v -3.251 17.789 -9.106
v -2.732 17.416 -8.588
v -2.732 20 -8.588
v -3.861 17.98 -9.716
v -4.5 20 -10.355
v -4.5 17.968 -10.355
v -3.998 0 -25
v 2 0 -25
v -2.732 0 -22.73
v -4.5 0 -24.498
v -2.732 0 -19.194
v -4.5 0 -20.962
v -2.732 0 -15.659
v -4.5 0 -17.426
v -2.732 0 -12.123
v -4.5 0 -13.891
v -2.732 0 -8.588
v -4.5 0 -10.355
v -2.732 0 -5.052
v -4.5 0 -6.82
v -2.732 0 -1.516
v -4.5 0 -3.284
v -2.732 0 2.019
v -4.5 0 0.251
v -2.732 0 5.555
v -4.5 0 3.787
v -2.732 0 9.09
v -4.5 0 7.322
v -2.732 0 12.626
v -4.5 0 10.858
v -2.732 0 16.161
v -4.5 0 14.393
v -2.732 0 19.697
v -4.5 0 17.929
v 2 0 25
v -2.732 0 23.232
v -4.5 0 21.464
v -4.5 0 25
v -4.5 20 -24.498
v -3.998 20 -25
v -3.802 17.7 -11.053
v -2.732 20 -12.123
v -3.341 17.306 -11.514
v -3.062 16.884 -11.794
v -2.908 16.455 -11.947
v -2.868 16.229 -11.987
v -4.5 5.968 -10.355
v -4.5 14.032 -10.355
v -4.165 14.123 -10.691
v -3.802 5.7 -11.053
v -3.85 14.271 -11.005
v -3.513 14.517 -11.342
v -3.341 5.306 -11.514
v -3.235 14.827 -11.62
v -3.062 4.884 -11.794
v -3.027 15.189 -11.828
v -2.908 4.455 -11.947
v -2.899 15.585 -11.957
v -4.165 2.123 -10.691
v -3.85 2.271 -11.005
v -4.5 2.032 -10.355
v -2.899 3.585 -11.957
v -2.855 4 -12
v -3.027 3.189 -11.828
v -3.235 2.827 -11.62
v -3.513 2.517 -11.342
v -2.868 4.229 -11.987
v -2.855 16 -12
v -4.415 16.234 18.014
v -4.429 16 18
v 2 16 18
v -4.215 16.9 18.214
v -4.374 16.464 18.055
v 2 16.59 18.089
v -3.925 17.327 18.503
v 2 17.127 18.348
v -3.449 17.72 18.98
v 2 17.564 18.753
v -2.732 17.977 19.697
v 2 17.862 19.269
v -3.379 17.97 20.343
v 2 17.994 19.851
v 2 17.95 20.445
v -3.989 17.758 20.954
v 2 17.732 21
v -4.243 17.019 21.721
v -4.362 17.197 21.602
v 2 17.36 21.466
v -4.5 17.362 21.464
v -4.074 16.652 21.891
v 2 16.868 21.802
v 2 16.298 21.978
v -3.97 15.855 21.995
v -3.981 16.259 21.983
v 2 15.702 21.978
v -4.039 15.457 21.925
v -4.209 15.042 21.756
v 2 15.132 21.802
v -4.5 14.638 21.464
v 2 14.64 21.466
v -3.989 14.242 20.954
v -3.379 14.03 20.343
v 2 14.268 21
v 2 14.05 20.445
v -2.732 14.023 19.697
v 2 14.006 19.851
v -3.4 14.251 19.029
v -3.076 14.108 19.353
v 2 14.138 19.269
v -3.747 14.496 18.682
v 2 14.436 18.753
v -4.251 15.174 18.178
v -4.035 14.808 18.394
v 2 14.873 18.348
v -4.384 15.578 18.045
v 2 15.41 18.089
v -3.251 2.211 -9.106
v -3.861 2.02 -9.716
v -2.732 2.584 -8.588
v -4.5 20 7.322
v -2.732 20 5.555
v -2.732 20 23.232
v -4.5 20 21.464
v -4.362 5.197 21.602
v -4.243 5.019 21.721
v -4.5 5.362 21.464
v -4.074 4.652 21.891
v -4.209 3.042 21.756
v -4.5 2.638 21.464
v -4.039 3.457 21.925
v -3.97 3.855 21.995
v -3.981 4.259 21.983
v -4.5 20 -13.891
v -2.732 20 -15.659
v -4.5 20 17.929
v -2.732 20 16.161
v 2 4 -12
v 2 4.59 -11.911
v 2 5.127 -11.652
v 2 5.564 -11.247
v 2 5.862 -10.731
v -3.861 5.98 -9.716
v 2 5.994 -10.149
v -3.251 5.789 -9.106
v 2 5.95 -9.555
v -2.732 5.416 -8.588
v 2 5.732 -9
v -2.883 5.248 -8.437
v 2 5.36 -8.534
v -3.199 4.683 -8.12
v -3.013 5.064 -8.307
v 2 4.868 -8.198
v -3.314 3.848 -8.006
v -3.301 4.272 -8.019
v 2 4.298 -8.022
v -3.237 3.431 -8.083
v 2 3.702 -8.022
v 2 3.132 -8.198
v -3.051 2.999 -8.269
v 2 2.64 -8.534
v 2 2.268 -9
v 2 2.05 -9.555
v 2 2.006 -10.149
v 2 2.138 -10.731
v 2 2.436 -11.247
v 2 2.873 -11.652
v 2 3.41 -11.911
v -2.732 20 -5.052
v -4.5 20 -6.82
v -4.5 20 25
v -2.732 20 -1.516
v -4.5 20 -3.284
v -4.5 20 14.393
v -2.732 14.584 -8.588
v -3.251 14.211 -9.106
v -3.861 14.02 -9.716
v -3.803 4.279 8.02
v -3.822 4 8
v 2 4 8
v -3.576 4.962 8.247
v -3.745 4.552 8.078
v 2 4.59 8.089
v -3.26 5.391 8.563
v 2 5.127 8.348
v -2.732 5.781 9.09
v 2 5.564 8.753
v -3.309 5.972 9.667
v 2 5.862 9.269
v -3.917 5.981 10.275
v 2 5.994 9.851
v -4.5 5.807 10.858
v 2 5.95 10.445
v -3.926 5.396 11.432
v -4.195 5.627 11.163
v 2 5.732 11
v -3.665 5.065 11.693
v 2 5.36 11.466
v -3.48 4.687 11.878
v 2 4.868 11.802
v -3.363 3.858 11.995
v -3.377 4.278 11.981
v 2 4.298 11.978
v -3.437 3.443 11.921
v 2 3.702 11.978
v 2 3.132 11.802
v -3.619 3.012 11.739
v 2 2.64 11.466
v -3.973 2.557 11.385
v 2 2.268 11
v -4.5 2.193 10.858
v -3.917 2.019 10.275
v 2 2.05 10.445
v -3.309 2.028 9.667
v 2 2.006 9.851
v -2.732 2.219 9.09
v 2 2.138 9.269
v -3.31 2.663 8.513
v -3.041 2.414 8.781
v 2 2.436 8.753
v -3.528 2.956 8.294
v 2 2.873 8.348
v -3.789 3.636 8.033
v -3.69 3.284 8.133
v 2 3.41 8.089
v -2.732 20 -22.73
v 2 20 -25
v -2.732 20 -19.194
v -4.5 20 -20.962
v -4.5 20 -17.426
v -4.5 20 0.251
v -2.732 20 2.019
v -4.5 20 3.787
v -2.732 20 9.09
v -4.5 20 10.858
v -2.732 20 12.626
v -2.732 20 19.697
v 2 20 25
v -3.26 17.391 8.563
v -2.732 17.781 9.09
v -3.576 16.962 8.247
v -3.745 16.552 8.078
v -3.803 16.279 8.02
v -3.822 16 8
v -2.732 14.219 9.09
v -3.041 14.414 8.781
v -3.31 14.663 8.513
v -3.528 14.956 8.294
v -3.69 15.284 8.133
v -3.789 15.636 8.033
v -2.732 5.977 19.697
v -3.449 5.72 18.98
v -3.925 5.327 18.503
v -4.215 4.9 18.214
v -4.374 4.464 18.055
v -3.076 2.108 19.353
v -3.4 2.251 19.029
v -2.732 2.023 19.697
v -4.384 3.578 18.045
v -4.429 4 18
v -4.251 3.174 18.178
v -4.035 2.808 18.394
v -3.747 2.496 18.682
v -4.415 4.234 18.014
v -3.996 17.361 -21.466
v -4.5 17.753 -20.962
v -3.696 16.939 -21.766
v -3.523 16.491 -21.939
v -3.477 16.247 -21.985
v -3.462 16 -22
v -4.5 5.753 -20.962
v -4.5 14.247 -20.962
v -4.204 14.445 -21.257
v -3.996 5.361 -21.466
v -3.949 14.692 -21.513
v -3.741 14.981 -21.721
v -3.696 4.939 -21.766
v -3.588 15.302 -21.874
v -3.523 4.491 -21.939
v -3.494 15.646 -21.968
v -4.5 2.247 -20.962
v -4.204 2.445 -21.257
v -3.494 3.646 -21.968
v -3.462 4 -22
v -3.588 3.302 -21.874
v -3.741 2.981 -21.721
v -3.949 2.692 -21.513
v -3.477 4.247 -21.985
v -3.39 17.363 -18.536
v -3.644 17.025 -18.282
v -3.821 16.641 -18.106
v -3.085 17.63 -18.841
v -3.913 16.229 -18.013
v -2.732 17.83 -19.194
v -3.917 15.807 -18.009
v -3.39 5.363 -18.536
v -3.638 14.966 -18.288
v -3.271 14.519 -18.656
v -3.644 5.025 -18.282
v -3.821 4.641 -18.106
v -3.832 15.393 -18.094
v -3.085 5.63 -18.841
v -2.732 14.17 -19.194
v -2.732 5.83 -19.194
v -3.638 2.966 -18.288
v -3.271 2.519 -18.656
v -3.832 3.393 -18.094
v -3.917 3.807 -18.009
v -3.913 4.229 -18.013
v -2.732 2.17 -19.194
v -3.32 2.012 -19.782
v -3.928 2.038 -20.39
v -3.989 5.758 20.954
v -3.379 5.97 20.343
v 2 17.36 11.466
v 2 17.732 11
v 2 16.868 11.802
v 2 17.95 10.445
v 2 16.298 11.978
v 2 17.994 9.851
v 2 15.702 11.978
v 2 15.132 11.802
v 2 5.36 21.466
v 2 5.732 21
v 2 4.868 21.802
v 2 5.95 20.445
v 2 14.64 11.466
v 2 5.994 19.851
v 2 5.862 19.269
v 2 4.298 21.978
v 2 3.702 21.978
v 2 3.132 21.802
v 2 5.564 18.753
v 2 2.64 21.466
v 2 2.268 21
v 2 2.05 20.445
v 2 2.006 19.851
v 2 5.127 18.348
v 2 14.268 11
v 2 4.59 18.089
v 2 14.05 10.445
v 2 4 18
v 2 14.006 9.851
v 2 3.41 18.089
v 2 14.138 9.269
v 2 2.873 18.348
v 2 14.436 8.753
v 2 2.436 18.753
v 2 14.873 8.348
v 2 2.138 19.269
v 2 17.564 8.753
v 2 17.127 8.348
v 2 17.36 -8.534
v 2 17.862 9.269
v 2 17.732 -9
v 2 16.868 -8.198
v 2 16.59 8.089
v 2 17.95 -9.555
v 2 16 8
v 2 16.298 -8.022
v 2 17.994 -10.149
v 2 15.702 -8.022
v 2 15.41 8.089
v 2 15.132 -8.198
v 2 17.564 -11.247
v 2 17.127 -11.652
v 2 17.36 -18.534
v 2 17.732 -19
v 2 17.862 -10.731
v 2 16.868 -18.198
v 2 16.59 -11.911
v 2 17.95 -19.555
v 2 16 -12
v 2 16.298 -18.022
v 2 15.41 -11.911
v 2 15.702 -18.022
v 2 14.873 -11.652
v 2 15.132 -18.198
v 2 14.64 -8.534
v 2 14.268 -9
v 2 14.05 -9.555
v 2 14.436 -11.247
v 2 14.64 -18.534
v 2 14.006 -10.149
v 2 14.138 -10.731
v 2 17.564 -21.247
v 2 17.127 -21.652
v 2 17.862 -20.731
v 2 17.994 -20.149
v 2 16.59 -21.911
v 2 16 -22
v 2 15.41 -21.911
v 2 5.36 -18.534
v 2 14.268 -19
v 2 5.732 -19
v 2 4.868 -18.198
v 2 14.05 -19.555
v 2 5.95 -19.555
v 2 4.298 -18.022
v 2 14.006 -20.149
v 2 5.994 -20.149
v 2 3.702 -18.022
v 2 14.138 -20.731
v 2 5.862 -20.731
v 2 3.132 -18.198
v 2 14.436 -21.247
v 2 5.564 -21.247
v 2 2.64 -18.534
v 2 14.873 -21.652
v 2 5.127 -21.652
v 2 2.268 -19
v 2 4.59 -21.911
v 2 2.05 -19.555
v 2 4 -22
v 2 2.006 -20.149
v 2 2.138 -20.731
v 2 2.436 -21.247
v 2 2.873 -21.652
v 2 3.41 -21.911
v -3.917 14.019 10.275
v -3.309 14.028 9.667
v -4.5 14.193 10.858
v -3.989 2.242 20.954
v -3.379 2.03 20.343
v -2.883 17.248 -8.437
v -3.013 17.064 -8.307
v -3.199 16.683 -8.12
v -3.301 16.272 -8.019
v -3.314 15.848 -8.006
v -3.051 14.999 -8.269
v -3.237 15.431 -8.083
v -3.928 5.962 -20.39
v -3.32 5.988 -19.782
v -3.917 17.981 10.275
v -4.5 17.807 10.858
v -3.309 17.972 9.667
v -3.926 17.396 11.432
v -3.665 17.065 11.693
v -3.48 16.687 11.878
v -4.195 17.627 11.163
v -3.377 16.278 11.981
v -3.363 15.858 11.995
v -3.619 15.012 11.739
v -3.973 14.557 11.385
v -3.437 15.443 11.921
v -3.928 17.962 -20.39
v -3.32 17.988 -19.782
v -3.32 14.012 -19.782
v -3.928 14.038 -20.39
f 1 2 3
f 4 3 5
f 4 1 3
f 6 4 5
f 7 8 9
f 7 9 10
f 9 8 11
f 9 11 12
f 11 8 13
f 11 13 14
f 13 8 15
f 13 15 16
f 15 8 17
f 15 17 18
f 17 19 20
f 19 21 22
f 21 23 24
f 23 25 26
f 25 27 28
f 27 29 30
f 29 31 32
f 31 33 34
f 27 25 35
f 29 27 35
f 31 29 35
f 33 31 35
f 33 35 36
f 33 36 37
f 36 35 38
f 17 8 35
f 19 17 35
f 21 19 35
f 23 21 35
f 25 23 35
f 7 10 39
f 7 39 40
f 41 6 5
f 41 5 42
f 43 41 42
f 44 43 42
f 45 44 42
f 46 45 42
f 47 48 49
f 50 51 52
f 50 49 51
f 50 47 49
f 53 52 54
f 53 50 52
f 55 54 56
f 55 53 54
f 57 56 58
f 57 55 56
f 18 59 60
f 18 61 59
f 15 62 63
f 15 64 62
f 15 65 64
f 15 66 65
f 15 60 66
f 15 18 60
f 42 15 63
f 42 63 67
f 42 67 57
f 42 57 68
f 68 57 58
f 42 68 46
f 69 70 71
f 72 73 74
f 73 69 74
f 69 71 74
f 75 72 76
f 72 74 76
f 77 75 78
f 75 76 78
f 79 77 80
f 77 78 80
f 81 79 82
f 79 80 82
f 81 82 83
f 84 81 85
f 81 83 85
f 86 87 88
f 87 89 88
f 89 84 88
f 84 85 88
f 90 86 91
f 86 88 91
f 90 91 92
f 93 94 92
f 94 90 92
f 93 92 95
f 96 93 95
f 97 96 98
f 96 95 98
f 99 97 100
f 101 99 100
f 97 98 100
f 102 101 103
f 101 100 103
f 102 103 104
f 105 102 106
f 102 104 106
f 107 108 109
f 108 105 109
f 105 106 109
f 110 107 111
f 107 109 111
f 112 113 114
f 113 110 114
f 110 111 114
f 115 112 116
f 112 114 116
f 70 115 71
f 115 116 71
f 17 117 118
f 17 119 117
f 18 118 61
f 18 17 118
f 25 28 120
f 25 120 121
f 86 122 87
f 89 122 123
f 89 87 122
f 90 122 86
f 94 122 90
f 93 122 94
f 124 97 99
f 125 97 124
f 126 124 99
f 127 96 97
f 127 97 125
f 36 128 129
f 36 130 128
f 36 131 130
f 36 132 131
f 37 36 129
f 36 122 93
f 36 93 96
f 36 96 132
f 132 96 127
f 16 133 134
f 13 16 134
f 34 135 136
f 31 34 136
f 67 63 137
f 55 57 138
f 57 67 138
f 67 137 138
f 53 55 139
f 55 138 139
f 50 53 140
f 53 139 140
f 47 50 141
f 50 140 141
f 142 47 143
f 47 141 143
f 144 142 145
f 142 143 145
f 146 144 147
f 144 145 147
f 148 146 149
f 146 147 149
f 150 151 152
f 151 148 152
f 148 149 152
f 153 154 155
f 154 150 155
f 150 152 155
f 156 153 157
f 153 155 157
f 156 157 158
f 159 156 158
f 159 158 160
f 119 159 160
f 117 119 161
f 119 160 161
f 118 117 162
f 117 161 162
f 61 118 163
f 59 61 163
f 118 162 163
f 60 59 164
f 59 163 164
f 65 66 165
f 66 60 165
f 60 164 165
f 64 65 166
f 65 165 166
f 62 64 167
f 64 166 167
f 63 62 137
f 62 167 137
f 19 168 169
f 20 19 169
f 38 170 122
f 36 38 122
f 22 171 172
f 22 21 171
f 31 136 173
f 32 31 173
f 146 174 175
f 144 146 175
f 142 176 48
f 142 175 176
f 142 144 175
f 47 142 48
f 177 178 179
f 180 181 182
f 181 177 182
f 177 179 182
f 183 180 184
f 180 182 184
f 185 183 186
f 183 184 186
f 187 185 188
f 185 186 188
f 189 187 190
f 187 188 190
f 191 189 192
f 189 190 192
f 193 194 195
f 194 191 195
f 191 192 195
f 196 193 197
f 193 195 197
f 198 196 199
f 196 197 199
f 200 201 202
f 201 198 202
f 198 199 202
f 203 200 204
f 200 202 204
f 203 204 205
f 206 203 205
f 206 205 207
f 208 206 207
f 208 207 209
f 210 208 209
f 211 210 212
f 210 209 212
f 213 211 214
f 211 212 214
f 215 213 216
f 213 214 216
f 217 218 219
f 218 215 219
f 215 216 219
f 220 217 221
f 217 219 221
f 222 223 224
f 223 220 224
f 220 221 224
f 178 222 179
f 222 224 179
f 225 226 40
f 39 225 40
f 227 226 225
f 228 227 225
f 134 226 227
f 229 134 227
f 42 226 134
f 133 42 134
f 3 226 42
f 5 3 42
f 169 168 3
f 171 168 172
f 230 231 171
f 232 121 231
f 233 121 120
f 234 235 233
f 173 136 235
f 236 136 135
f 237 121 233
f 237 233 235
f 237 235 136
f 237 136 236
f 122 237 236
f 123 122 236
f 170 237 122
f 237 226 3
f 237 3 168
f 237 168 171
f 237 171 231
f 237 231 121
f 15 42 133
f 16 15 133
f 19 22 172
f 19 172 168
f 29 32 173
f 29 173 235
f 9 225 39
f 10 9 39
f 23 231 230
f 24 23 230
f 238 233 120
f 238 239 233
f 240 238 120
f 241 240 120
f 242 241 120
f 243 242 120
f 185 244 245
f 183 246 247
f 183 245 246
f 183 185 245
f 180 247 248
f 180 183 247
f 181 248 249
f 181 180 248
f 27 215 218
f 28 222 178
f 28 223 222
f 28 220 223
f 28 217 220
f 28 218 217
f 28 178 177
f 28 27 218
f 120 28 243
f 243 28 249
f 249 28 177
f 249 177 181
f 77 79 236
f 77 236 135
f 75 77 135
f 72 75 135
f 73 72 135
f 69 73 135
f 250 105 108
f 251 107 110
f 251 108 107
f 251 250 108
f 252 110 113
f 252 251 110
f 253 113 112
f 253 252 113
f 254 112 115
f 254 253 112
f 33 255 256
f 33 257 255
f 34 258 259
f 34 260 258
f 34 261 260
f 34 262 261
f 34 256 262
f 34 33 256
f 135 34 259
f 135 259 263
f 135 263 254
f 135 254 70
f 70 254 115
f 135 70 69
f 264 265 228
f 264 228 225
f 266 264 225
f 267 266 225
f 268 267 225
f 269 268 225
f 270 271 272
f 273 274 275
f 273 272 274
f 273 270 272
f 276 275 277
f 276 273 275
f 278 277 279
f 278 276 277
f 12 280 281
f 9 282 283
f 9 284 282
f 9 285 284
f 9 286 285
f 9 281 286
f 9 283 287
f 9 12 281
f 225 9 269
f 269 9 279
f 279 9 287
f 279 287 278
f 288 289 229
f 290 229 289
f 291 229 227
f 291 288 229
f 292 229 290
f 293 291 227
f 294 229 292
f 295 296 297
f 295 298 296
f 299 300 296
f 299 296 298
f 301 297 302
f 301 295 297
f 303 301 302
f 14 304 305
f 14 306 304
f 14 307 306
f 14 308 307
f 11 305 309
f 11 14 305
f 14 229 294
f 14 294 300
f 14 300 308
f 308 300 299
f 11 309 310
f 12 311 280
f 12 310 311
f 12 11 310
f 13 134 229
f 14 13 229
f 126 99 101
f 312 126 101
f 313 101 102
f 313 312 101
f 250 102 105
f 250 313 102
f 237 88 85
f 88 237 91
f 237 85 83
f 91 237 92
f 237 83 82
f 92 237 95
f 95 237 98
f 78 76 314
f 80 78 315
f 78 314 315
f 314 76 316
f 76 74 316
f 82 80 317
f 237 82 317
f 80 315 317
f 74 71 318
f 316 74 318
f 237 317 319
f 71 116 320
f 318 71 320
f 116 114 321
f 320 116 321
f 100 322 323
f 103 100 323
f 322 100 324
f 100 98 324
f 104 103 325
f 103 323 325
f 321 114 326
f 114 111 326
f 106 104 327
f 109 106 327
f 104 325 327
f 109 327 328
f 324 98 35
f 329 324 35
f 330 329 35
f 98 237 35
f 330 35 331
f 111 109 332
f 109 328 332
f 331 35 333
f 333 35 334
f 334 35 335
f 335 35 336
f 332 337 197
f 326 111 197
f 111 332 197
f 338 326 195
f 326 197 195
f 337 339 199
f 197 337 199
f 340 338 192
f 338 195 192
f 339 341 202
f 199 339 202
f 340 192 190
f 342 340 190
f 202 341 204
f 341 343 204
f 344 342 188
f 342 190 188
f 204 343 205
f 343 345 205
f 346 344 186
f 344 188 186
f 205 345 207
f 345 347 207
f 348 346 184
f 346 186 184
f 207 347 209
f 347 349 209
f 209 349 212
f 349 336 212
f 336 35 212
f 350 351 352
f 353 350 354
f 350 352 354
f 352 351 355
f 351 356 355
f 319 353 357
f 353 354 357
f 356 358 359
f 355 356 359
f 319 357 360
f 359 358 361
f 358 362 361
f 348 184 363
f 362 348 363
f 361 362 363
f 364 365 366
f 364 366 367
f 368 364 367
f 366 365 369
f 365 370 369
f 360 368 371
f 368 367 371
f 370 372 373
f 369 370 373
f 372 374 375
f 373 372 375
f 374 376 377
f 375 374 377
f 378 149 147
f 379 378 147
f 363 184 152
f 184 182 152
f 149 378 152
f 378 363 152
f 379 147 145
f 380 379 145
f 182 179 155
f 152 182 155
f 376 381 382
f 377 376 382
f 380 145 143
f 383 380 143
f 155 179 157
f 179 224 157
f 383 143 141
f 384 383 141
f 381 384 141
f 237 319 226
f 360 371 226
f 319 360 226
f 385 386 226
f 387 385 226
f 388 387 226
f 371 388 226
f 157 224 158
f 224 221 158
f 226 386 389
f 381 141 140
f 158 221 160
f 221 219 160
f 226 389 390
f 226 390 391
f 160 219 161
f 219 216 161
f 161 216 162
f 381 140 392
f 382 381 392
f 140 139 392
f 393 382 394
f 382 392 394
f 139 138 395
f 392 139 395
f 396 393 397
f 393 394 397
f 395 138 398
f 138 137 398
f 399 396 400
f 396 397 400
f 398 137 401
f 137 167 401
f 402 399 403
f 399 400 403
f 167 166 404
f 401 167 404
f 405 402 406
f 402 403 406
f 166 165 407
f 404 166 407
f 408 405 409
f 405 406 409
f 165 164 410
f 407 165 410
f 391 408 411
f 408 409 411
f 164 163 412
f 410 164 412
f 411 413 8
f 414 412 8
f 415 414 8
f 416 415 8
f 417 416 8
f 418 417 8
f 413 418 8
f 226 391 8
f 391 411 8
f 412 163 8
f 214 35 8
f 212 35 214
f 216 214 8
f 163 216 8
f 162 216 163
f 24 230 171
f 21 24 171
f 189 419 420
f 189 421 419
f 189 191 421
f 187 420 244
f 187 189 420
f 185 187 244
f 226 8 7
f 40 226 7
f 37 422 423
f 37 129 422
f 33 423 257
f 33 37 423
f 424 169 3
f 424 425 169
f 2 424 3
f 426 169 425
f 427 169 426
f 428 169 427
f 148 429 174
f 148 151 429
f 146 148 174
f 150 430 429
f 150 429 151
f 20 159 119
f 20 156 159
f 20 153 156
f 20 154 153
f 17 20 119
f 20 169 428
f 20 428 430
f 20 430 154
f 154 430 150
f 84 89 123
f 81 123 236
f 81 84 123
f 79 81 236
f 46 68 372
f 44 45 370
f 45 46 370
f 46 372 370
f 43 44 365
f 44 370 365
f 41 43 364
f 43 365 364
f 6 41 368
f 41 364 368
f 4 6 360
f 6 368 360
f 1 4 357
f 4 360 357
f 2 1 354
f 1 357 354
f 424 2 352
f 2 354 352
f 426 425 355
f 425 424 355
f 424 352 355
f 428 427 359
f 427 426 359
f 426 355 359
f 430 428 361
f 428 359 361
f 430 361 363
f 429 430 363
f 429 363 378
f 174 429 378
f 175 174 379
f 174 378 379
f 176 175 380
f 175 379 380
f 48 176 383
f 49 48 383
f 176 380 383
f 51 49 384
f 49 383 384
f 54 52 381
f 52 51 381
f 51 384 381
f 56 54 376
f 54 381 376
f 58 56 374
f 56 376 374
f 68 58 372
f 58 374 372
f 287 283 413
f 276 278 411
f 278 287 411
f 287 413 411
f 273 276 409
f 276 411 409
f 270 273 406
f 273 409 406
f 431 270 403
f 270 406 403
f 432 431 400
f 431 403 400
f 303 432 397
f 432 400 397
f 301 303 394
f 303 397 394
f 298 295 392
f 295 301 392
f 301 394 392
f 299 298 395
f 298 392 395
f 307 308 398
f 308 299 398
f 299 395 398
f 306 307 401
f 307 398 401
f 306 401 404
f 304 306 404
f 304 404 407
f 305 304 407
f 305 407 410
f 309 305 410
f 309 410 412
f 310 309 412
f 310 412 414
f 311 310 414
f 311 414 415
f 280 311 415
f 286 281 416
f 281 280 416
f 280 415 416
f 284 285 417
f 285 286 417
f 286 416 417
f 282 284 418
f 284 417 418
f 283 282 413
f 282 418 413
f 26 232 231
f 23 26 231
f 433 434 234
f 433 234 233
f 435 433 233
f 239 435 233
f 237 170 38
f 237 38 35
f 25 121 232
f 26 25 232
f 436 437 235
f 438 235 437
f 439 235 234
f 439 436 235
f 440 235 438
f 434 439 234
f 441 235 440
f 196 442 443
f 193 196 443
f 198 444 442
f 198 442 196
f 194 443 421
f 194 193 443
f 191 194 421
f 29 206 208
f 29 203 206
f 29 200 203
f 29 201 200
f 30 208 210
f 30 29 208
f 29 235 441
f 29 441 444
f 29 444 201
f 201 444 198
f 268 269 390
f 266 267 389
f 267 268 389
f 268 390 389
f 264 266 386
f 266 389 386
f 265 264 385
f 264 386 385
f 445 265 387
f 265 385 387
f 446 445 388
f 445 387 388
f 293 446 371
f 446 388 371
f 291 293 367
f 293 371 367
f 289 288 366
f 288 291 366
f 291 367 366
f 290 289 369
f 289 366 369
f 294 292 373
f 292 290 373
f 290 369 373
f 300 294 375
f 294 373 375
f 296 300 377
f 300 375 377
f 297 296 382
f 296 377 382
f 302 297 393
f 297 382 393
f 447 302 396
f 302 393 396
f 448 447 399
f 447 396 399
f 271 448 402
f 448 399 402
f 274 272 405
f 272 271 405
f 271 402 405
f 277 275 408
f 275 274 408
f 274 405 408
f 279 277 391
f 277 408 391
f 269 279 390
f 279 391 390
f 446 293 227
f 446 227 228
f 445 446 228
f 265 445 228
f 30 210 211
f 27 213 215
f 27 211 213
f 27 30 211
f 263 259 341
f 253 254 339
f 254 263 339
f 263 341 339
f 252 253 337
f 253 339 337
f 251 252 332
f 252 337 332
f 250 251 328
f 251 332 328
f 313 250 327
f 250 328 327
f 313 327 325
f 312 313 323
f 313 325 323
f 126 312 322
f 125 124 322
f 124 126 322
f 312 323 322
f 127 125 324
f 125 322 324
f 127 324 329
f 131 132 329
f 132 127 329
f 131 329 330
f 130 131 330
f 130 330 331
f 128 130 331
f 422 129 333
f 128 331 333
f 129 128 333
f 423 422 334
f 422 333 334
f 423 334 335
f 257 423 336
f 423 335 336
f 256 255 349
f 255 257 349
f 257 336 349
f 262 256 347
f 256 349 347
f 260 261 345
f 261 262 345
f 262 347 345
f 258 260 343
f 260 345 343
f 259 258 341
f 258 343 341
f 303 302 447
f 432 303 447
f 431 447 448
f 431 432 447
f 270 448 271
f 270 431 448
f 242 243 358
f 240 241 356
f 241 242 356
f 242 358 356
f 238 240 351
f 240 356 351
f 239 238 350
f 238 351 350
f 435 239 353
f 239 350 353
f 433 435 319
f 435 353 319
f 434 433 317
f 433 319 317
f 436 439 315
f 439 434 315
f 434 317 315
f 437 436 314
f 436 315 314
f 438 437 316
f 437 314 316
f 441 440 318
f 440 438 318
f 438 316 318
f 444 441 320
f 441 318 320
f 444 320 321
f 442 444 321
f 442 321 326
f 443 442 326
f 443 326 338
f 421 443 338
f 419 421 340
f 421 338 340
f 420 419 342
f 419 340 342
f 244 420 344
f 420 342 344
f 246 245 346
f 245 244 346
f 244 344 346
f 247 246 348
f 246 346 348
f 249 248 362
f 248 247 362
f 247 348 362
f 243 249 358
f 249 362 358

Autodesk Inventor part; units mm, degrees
ref_plane "YZ Plane" through (0, 0, 0) normal (1, 0, 0) x (0, 1, 0)
ref_plane "XZ Plane" through (0, 0, 0) normal (0, 1, 0) x (-1, 0, 0)
ref_plane "XY Plane" through (0, 0, 0) normal (0, 0, 1) x (1, 0, 0)
sketch "Sketch1" plane through (0, 0, 0) normal (0, 1, 0) x (-1, 0, 0)
  line L0 (2, 25) -> (-2, 25)
  line L1 (-2, 25) -> (-2, -25)
  line L2 (-2, -25) -> (2, -25)
  line L3 (2, -25) -> (2, 25)
  line L4 (2, 25) -> (4.5, 25)
  line L5 (4.5, 25) -> (2.7322, 23.2322)
  line L6 (2.7322, 23.2322) -> (4.5, 21.4645)
  line L7 (4.5, 21.4645) -> (2.7322, 19.6967)
  line L8 (2.7322, 19.6967) -> (4.5, 17.9289)
  line L9 (4.5, 17.9289) -> (2.7322, 16.1612)
  line L10 (2.7322, 16.1612) -> (4.5, 14.3934)
  line L11 (4.5, 14.3934) -> (2.7322, 12.6256)
  line L12 (2.7322, 12.6256) -> (4.5, 10.8579)
  line L13 (4.5, 10.8579) -> (2.7322, 9.0901)
  line L14 (2.7322, 9.0901) -> (4.5, 7.3223)
  line L15 (4.5, 7.3223) -> (2.7322, 5.5546)
  line L16 (2.7322, 5.5546) -> (4.5, 3.7868)
  line L17 (4.5, 3.7868) -> (2.7322, 2.019)
  line L18 (2.7322, 2.019) -> (4.5, 0.2513)
  line L19 (4.5, 0.2513) -> (2.7322, -1.5165)
  line L20 (2.7322, -1.5165) -> (4.5, -3.2843)
  line L21 (4.5, -3.2843) -> (2.7322, -5.052)
  line L22 (2.7322, -5.052) -> (4.5, -6.8198)
  line L23 (4.5, -6.8198) -> (2.7322, -8.5876)
  line L24 (2.7322, -8.5876) -> (4.5, -10.3553)
  line L25 (4.5, -10.3553) -> (2.7322, -12.1231)
  line L26 (2.7322, -12.1231) -> (4.5, -13.8909)
  line L27 (4.5, -13.8909) -> (2.7322, -15.6586)
  line L28 (2.7322, -15.6586) -> (4.5, -17.4264)
  line L29 (4.5, -17.4264) -> (2.7322, -19.1942)
  line L30 (2.7322, -19.1942) -> (4.5, -20.9619)
  line L31 (4.5, -20.9619) -> (2.7322, -22.7297)
  line L32 (2.7322, -22.7297) -> (4.5, -24.4975)
  line L33 (4.5, -24.4975) -> (3.9975, -25)
  line L34 (3.9975, -25) -> (2, -25)
  point P0 (0, 0)
  dimension "d0" = 4
  dimension "d1" = 50
  dimension "d2" = 2.5
  dimension "d3" = 2.5
  dimension "d4" = 45
  dimension "d5" = 2.5
extrude "Extrusion1" add sketch "Sketch1" along normal blind 20
sketch "Sketch2" plane through (2, 0, 25) normal (1, 0, 0) x (0, 0, -1)
  circle A0 centre (15, 4) radius 2
  circle A1 centre (35, 4) radius 2
  circle A2 centre (35, 16) radius 2
  circle A3 centre (15, 16) radius 2
  circle A4 centre (45, 16) radius 2
  circle A5 centre (45, 4) radius 2
  circle A6 centre (5, 4) radius 2
  circle A7 centre (5, 16) radius 2
  point P0 (25, 0)
  dimension "d8" = 4
  dimension "d9" = 4
  dimension "d10" = 4
  dimension "d11" = 4
  dimension "d12" = 4
  dimension "d13" = 4
  dimension "d14" = 4
  dimension "d15" = 4
extrude "Extrusion2" cut sketch "Sketch2" against normal blind 20
properties part number "beltTensionerSide"
